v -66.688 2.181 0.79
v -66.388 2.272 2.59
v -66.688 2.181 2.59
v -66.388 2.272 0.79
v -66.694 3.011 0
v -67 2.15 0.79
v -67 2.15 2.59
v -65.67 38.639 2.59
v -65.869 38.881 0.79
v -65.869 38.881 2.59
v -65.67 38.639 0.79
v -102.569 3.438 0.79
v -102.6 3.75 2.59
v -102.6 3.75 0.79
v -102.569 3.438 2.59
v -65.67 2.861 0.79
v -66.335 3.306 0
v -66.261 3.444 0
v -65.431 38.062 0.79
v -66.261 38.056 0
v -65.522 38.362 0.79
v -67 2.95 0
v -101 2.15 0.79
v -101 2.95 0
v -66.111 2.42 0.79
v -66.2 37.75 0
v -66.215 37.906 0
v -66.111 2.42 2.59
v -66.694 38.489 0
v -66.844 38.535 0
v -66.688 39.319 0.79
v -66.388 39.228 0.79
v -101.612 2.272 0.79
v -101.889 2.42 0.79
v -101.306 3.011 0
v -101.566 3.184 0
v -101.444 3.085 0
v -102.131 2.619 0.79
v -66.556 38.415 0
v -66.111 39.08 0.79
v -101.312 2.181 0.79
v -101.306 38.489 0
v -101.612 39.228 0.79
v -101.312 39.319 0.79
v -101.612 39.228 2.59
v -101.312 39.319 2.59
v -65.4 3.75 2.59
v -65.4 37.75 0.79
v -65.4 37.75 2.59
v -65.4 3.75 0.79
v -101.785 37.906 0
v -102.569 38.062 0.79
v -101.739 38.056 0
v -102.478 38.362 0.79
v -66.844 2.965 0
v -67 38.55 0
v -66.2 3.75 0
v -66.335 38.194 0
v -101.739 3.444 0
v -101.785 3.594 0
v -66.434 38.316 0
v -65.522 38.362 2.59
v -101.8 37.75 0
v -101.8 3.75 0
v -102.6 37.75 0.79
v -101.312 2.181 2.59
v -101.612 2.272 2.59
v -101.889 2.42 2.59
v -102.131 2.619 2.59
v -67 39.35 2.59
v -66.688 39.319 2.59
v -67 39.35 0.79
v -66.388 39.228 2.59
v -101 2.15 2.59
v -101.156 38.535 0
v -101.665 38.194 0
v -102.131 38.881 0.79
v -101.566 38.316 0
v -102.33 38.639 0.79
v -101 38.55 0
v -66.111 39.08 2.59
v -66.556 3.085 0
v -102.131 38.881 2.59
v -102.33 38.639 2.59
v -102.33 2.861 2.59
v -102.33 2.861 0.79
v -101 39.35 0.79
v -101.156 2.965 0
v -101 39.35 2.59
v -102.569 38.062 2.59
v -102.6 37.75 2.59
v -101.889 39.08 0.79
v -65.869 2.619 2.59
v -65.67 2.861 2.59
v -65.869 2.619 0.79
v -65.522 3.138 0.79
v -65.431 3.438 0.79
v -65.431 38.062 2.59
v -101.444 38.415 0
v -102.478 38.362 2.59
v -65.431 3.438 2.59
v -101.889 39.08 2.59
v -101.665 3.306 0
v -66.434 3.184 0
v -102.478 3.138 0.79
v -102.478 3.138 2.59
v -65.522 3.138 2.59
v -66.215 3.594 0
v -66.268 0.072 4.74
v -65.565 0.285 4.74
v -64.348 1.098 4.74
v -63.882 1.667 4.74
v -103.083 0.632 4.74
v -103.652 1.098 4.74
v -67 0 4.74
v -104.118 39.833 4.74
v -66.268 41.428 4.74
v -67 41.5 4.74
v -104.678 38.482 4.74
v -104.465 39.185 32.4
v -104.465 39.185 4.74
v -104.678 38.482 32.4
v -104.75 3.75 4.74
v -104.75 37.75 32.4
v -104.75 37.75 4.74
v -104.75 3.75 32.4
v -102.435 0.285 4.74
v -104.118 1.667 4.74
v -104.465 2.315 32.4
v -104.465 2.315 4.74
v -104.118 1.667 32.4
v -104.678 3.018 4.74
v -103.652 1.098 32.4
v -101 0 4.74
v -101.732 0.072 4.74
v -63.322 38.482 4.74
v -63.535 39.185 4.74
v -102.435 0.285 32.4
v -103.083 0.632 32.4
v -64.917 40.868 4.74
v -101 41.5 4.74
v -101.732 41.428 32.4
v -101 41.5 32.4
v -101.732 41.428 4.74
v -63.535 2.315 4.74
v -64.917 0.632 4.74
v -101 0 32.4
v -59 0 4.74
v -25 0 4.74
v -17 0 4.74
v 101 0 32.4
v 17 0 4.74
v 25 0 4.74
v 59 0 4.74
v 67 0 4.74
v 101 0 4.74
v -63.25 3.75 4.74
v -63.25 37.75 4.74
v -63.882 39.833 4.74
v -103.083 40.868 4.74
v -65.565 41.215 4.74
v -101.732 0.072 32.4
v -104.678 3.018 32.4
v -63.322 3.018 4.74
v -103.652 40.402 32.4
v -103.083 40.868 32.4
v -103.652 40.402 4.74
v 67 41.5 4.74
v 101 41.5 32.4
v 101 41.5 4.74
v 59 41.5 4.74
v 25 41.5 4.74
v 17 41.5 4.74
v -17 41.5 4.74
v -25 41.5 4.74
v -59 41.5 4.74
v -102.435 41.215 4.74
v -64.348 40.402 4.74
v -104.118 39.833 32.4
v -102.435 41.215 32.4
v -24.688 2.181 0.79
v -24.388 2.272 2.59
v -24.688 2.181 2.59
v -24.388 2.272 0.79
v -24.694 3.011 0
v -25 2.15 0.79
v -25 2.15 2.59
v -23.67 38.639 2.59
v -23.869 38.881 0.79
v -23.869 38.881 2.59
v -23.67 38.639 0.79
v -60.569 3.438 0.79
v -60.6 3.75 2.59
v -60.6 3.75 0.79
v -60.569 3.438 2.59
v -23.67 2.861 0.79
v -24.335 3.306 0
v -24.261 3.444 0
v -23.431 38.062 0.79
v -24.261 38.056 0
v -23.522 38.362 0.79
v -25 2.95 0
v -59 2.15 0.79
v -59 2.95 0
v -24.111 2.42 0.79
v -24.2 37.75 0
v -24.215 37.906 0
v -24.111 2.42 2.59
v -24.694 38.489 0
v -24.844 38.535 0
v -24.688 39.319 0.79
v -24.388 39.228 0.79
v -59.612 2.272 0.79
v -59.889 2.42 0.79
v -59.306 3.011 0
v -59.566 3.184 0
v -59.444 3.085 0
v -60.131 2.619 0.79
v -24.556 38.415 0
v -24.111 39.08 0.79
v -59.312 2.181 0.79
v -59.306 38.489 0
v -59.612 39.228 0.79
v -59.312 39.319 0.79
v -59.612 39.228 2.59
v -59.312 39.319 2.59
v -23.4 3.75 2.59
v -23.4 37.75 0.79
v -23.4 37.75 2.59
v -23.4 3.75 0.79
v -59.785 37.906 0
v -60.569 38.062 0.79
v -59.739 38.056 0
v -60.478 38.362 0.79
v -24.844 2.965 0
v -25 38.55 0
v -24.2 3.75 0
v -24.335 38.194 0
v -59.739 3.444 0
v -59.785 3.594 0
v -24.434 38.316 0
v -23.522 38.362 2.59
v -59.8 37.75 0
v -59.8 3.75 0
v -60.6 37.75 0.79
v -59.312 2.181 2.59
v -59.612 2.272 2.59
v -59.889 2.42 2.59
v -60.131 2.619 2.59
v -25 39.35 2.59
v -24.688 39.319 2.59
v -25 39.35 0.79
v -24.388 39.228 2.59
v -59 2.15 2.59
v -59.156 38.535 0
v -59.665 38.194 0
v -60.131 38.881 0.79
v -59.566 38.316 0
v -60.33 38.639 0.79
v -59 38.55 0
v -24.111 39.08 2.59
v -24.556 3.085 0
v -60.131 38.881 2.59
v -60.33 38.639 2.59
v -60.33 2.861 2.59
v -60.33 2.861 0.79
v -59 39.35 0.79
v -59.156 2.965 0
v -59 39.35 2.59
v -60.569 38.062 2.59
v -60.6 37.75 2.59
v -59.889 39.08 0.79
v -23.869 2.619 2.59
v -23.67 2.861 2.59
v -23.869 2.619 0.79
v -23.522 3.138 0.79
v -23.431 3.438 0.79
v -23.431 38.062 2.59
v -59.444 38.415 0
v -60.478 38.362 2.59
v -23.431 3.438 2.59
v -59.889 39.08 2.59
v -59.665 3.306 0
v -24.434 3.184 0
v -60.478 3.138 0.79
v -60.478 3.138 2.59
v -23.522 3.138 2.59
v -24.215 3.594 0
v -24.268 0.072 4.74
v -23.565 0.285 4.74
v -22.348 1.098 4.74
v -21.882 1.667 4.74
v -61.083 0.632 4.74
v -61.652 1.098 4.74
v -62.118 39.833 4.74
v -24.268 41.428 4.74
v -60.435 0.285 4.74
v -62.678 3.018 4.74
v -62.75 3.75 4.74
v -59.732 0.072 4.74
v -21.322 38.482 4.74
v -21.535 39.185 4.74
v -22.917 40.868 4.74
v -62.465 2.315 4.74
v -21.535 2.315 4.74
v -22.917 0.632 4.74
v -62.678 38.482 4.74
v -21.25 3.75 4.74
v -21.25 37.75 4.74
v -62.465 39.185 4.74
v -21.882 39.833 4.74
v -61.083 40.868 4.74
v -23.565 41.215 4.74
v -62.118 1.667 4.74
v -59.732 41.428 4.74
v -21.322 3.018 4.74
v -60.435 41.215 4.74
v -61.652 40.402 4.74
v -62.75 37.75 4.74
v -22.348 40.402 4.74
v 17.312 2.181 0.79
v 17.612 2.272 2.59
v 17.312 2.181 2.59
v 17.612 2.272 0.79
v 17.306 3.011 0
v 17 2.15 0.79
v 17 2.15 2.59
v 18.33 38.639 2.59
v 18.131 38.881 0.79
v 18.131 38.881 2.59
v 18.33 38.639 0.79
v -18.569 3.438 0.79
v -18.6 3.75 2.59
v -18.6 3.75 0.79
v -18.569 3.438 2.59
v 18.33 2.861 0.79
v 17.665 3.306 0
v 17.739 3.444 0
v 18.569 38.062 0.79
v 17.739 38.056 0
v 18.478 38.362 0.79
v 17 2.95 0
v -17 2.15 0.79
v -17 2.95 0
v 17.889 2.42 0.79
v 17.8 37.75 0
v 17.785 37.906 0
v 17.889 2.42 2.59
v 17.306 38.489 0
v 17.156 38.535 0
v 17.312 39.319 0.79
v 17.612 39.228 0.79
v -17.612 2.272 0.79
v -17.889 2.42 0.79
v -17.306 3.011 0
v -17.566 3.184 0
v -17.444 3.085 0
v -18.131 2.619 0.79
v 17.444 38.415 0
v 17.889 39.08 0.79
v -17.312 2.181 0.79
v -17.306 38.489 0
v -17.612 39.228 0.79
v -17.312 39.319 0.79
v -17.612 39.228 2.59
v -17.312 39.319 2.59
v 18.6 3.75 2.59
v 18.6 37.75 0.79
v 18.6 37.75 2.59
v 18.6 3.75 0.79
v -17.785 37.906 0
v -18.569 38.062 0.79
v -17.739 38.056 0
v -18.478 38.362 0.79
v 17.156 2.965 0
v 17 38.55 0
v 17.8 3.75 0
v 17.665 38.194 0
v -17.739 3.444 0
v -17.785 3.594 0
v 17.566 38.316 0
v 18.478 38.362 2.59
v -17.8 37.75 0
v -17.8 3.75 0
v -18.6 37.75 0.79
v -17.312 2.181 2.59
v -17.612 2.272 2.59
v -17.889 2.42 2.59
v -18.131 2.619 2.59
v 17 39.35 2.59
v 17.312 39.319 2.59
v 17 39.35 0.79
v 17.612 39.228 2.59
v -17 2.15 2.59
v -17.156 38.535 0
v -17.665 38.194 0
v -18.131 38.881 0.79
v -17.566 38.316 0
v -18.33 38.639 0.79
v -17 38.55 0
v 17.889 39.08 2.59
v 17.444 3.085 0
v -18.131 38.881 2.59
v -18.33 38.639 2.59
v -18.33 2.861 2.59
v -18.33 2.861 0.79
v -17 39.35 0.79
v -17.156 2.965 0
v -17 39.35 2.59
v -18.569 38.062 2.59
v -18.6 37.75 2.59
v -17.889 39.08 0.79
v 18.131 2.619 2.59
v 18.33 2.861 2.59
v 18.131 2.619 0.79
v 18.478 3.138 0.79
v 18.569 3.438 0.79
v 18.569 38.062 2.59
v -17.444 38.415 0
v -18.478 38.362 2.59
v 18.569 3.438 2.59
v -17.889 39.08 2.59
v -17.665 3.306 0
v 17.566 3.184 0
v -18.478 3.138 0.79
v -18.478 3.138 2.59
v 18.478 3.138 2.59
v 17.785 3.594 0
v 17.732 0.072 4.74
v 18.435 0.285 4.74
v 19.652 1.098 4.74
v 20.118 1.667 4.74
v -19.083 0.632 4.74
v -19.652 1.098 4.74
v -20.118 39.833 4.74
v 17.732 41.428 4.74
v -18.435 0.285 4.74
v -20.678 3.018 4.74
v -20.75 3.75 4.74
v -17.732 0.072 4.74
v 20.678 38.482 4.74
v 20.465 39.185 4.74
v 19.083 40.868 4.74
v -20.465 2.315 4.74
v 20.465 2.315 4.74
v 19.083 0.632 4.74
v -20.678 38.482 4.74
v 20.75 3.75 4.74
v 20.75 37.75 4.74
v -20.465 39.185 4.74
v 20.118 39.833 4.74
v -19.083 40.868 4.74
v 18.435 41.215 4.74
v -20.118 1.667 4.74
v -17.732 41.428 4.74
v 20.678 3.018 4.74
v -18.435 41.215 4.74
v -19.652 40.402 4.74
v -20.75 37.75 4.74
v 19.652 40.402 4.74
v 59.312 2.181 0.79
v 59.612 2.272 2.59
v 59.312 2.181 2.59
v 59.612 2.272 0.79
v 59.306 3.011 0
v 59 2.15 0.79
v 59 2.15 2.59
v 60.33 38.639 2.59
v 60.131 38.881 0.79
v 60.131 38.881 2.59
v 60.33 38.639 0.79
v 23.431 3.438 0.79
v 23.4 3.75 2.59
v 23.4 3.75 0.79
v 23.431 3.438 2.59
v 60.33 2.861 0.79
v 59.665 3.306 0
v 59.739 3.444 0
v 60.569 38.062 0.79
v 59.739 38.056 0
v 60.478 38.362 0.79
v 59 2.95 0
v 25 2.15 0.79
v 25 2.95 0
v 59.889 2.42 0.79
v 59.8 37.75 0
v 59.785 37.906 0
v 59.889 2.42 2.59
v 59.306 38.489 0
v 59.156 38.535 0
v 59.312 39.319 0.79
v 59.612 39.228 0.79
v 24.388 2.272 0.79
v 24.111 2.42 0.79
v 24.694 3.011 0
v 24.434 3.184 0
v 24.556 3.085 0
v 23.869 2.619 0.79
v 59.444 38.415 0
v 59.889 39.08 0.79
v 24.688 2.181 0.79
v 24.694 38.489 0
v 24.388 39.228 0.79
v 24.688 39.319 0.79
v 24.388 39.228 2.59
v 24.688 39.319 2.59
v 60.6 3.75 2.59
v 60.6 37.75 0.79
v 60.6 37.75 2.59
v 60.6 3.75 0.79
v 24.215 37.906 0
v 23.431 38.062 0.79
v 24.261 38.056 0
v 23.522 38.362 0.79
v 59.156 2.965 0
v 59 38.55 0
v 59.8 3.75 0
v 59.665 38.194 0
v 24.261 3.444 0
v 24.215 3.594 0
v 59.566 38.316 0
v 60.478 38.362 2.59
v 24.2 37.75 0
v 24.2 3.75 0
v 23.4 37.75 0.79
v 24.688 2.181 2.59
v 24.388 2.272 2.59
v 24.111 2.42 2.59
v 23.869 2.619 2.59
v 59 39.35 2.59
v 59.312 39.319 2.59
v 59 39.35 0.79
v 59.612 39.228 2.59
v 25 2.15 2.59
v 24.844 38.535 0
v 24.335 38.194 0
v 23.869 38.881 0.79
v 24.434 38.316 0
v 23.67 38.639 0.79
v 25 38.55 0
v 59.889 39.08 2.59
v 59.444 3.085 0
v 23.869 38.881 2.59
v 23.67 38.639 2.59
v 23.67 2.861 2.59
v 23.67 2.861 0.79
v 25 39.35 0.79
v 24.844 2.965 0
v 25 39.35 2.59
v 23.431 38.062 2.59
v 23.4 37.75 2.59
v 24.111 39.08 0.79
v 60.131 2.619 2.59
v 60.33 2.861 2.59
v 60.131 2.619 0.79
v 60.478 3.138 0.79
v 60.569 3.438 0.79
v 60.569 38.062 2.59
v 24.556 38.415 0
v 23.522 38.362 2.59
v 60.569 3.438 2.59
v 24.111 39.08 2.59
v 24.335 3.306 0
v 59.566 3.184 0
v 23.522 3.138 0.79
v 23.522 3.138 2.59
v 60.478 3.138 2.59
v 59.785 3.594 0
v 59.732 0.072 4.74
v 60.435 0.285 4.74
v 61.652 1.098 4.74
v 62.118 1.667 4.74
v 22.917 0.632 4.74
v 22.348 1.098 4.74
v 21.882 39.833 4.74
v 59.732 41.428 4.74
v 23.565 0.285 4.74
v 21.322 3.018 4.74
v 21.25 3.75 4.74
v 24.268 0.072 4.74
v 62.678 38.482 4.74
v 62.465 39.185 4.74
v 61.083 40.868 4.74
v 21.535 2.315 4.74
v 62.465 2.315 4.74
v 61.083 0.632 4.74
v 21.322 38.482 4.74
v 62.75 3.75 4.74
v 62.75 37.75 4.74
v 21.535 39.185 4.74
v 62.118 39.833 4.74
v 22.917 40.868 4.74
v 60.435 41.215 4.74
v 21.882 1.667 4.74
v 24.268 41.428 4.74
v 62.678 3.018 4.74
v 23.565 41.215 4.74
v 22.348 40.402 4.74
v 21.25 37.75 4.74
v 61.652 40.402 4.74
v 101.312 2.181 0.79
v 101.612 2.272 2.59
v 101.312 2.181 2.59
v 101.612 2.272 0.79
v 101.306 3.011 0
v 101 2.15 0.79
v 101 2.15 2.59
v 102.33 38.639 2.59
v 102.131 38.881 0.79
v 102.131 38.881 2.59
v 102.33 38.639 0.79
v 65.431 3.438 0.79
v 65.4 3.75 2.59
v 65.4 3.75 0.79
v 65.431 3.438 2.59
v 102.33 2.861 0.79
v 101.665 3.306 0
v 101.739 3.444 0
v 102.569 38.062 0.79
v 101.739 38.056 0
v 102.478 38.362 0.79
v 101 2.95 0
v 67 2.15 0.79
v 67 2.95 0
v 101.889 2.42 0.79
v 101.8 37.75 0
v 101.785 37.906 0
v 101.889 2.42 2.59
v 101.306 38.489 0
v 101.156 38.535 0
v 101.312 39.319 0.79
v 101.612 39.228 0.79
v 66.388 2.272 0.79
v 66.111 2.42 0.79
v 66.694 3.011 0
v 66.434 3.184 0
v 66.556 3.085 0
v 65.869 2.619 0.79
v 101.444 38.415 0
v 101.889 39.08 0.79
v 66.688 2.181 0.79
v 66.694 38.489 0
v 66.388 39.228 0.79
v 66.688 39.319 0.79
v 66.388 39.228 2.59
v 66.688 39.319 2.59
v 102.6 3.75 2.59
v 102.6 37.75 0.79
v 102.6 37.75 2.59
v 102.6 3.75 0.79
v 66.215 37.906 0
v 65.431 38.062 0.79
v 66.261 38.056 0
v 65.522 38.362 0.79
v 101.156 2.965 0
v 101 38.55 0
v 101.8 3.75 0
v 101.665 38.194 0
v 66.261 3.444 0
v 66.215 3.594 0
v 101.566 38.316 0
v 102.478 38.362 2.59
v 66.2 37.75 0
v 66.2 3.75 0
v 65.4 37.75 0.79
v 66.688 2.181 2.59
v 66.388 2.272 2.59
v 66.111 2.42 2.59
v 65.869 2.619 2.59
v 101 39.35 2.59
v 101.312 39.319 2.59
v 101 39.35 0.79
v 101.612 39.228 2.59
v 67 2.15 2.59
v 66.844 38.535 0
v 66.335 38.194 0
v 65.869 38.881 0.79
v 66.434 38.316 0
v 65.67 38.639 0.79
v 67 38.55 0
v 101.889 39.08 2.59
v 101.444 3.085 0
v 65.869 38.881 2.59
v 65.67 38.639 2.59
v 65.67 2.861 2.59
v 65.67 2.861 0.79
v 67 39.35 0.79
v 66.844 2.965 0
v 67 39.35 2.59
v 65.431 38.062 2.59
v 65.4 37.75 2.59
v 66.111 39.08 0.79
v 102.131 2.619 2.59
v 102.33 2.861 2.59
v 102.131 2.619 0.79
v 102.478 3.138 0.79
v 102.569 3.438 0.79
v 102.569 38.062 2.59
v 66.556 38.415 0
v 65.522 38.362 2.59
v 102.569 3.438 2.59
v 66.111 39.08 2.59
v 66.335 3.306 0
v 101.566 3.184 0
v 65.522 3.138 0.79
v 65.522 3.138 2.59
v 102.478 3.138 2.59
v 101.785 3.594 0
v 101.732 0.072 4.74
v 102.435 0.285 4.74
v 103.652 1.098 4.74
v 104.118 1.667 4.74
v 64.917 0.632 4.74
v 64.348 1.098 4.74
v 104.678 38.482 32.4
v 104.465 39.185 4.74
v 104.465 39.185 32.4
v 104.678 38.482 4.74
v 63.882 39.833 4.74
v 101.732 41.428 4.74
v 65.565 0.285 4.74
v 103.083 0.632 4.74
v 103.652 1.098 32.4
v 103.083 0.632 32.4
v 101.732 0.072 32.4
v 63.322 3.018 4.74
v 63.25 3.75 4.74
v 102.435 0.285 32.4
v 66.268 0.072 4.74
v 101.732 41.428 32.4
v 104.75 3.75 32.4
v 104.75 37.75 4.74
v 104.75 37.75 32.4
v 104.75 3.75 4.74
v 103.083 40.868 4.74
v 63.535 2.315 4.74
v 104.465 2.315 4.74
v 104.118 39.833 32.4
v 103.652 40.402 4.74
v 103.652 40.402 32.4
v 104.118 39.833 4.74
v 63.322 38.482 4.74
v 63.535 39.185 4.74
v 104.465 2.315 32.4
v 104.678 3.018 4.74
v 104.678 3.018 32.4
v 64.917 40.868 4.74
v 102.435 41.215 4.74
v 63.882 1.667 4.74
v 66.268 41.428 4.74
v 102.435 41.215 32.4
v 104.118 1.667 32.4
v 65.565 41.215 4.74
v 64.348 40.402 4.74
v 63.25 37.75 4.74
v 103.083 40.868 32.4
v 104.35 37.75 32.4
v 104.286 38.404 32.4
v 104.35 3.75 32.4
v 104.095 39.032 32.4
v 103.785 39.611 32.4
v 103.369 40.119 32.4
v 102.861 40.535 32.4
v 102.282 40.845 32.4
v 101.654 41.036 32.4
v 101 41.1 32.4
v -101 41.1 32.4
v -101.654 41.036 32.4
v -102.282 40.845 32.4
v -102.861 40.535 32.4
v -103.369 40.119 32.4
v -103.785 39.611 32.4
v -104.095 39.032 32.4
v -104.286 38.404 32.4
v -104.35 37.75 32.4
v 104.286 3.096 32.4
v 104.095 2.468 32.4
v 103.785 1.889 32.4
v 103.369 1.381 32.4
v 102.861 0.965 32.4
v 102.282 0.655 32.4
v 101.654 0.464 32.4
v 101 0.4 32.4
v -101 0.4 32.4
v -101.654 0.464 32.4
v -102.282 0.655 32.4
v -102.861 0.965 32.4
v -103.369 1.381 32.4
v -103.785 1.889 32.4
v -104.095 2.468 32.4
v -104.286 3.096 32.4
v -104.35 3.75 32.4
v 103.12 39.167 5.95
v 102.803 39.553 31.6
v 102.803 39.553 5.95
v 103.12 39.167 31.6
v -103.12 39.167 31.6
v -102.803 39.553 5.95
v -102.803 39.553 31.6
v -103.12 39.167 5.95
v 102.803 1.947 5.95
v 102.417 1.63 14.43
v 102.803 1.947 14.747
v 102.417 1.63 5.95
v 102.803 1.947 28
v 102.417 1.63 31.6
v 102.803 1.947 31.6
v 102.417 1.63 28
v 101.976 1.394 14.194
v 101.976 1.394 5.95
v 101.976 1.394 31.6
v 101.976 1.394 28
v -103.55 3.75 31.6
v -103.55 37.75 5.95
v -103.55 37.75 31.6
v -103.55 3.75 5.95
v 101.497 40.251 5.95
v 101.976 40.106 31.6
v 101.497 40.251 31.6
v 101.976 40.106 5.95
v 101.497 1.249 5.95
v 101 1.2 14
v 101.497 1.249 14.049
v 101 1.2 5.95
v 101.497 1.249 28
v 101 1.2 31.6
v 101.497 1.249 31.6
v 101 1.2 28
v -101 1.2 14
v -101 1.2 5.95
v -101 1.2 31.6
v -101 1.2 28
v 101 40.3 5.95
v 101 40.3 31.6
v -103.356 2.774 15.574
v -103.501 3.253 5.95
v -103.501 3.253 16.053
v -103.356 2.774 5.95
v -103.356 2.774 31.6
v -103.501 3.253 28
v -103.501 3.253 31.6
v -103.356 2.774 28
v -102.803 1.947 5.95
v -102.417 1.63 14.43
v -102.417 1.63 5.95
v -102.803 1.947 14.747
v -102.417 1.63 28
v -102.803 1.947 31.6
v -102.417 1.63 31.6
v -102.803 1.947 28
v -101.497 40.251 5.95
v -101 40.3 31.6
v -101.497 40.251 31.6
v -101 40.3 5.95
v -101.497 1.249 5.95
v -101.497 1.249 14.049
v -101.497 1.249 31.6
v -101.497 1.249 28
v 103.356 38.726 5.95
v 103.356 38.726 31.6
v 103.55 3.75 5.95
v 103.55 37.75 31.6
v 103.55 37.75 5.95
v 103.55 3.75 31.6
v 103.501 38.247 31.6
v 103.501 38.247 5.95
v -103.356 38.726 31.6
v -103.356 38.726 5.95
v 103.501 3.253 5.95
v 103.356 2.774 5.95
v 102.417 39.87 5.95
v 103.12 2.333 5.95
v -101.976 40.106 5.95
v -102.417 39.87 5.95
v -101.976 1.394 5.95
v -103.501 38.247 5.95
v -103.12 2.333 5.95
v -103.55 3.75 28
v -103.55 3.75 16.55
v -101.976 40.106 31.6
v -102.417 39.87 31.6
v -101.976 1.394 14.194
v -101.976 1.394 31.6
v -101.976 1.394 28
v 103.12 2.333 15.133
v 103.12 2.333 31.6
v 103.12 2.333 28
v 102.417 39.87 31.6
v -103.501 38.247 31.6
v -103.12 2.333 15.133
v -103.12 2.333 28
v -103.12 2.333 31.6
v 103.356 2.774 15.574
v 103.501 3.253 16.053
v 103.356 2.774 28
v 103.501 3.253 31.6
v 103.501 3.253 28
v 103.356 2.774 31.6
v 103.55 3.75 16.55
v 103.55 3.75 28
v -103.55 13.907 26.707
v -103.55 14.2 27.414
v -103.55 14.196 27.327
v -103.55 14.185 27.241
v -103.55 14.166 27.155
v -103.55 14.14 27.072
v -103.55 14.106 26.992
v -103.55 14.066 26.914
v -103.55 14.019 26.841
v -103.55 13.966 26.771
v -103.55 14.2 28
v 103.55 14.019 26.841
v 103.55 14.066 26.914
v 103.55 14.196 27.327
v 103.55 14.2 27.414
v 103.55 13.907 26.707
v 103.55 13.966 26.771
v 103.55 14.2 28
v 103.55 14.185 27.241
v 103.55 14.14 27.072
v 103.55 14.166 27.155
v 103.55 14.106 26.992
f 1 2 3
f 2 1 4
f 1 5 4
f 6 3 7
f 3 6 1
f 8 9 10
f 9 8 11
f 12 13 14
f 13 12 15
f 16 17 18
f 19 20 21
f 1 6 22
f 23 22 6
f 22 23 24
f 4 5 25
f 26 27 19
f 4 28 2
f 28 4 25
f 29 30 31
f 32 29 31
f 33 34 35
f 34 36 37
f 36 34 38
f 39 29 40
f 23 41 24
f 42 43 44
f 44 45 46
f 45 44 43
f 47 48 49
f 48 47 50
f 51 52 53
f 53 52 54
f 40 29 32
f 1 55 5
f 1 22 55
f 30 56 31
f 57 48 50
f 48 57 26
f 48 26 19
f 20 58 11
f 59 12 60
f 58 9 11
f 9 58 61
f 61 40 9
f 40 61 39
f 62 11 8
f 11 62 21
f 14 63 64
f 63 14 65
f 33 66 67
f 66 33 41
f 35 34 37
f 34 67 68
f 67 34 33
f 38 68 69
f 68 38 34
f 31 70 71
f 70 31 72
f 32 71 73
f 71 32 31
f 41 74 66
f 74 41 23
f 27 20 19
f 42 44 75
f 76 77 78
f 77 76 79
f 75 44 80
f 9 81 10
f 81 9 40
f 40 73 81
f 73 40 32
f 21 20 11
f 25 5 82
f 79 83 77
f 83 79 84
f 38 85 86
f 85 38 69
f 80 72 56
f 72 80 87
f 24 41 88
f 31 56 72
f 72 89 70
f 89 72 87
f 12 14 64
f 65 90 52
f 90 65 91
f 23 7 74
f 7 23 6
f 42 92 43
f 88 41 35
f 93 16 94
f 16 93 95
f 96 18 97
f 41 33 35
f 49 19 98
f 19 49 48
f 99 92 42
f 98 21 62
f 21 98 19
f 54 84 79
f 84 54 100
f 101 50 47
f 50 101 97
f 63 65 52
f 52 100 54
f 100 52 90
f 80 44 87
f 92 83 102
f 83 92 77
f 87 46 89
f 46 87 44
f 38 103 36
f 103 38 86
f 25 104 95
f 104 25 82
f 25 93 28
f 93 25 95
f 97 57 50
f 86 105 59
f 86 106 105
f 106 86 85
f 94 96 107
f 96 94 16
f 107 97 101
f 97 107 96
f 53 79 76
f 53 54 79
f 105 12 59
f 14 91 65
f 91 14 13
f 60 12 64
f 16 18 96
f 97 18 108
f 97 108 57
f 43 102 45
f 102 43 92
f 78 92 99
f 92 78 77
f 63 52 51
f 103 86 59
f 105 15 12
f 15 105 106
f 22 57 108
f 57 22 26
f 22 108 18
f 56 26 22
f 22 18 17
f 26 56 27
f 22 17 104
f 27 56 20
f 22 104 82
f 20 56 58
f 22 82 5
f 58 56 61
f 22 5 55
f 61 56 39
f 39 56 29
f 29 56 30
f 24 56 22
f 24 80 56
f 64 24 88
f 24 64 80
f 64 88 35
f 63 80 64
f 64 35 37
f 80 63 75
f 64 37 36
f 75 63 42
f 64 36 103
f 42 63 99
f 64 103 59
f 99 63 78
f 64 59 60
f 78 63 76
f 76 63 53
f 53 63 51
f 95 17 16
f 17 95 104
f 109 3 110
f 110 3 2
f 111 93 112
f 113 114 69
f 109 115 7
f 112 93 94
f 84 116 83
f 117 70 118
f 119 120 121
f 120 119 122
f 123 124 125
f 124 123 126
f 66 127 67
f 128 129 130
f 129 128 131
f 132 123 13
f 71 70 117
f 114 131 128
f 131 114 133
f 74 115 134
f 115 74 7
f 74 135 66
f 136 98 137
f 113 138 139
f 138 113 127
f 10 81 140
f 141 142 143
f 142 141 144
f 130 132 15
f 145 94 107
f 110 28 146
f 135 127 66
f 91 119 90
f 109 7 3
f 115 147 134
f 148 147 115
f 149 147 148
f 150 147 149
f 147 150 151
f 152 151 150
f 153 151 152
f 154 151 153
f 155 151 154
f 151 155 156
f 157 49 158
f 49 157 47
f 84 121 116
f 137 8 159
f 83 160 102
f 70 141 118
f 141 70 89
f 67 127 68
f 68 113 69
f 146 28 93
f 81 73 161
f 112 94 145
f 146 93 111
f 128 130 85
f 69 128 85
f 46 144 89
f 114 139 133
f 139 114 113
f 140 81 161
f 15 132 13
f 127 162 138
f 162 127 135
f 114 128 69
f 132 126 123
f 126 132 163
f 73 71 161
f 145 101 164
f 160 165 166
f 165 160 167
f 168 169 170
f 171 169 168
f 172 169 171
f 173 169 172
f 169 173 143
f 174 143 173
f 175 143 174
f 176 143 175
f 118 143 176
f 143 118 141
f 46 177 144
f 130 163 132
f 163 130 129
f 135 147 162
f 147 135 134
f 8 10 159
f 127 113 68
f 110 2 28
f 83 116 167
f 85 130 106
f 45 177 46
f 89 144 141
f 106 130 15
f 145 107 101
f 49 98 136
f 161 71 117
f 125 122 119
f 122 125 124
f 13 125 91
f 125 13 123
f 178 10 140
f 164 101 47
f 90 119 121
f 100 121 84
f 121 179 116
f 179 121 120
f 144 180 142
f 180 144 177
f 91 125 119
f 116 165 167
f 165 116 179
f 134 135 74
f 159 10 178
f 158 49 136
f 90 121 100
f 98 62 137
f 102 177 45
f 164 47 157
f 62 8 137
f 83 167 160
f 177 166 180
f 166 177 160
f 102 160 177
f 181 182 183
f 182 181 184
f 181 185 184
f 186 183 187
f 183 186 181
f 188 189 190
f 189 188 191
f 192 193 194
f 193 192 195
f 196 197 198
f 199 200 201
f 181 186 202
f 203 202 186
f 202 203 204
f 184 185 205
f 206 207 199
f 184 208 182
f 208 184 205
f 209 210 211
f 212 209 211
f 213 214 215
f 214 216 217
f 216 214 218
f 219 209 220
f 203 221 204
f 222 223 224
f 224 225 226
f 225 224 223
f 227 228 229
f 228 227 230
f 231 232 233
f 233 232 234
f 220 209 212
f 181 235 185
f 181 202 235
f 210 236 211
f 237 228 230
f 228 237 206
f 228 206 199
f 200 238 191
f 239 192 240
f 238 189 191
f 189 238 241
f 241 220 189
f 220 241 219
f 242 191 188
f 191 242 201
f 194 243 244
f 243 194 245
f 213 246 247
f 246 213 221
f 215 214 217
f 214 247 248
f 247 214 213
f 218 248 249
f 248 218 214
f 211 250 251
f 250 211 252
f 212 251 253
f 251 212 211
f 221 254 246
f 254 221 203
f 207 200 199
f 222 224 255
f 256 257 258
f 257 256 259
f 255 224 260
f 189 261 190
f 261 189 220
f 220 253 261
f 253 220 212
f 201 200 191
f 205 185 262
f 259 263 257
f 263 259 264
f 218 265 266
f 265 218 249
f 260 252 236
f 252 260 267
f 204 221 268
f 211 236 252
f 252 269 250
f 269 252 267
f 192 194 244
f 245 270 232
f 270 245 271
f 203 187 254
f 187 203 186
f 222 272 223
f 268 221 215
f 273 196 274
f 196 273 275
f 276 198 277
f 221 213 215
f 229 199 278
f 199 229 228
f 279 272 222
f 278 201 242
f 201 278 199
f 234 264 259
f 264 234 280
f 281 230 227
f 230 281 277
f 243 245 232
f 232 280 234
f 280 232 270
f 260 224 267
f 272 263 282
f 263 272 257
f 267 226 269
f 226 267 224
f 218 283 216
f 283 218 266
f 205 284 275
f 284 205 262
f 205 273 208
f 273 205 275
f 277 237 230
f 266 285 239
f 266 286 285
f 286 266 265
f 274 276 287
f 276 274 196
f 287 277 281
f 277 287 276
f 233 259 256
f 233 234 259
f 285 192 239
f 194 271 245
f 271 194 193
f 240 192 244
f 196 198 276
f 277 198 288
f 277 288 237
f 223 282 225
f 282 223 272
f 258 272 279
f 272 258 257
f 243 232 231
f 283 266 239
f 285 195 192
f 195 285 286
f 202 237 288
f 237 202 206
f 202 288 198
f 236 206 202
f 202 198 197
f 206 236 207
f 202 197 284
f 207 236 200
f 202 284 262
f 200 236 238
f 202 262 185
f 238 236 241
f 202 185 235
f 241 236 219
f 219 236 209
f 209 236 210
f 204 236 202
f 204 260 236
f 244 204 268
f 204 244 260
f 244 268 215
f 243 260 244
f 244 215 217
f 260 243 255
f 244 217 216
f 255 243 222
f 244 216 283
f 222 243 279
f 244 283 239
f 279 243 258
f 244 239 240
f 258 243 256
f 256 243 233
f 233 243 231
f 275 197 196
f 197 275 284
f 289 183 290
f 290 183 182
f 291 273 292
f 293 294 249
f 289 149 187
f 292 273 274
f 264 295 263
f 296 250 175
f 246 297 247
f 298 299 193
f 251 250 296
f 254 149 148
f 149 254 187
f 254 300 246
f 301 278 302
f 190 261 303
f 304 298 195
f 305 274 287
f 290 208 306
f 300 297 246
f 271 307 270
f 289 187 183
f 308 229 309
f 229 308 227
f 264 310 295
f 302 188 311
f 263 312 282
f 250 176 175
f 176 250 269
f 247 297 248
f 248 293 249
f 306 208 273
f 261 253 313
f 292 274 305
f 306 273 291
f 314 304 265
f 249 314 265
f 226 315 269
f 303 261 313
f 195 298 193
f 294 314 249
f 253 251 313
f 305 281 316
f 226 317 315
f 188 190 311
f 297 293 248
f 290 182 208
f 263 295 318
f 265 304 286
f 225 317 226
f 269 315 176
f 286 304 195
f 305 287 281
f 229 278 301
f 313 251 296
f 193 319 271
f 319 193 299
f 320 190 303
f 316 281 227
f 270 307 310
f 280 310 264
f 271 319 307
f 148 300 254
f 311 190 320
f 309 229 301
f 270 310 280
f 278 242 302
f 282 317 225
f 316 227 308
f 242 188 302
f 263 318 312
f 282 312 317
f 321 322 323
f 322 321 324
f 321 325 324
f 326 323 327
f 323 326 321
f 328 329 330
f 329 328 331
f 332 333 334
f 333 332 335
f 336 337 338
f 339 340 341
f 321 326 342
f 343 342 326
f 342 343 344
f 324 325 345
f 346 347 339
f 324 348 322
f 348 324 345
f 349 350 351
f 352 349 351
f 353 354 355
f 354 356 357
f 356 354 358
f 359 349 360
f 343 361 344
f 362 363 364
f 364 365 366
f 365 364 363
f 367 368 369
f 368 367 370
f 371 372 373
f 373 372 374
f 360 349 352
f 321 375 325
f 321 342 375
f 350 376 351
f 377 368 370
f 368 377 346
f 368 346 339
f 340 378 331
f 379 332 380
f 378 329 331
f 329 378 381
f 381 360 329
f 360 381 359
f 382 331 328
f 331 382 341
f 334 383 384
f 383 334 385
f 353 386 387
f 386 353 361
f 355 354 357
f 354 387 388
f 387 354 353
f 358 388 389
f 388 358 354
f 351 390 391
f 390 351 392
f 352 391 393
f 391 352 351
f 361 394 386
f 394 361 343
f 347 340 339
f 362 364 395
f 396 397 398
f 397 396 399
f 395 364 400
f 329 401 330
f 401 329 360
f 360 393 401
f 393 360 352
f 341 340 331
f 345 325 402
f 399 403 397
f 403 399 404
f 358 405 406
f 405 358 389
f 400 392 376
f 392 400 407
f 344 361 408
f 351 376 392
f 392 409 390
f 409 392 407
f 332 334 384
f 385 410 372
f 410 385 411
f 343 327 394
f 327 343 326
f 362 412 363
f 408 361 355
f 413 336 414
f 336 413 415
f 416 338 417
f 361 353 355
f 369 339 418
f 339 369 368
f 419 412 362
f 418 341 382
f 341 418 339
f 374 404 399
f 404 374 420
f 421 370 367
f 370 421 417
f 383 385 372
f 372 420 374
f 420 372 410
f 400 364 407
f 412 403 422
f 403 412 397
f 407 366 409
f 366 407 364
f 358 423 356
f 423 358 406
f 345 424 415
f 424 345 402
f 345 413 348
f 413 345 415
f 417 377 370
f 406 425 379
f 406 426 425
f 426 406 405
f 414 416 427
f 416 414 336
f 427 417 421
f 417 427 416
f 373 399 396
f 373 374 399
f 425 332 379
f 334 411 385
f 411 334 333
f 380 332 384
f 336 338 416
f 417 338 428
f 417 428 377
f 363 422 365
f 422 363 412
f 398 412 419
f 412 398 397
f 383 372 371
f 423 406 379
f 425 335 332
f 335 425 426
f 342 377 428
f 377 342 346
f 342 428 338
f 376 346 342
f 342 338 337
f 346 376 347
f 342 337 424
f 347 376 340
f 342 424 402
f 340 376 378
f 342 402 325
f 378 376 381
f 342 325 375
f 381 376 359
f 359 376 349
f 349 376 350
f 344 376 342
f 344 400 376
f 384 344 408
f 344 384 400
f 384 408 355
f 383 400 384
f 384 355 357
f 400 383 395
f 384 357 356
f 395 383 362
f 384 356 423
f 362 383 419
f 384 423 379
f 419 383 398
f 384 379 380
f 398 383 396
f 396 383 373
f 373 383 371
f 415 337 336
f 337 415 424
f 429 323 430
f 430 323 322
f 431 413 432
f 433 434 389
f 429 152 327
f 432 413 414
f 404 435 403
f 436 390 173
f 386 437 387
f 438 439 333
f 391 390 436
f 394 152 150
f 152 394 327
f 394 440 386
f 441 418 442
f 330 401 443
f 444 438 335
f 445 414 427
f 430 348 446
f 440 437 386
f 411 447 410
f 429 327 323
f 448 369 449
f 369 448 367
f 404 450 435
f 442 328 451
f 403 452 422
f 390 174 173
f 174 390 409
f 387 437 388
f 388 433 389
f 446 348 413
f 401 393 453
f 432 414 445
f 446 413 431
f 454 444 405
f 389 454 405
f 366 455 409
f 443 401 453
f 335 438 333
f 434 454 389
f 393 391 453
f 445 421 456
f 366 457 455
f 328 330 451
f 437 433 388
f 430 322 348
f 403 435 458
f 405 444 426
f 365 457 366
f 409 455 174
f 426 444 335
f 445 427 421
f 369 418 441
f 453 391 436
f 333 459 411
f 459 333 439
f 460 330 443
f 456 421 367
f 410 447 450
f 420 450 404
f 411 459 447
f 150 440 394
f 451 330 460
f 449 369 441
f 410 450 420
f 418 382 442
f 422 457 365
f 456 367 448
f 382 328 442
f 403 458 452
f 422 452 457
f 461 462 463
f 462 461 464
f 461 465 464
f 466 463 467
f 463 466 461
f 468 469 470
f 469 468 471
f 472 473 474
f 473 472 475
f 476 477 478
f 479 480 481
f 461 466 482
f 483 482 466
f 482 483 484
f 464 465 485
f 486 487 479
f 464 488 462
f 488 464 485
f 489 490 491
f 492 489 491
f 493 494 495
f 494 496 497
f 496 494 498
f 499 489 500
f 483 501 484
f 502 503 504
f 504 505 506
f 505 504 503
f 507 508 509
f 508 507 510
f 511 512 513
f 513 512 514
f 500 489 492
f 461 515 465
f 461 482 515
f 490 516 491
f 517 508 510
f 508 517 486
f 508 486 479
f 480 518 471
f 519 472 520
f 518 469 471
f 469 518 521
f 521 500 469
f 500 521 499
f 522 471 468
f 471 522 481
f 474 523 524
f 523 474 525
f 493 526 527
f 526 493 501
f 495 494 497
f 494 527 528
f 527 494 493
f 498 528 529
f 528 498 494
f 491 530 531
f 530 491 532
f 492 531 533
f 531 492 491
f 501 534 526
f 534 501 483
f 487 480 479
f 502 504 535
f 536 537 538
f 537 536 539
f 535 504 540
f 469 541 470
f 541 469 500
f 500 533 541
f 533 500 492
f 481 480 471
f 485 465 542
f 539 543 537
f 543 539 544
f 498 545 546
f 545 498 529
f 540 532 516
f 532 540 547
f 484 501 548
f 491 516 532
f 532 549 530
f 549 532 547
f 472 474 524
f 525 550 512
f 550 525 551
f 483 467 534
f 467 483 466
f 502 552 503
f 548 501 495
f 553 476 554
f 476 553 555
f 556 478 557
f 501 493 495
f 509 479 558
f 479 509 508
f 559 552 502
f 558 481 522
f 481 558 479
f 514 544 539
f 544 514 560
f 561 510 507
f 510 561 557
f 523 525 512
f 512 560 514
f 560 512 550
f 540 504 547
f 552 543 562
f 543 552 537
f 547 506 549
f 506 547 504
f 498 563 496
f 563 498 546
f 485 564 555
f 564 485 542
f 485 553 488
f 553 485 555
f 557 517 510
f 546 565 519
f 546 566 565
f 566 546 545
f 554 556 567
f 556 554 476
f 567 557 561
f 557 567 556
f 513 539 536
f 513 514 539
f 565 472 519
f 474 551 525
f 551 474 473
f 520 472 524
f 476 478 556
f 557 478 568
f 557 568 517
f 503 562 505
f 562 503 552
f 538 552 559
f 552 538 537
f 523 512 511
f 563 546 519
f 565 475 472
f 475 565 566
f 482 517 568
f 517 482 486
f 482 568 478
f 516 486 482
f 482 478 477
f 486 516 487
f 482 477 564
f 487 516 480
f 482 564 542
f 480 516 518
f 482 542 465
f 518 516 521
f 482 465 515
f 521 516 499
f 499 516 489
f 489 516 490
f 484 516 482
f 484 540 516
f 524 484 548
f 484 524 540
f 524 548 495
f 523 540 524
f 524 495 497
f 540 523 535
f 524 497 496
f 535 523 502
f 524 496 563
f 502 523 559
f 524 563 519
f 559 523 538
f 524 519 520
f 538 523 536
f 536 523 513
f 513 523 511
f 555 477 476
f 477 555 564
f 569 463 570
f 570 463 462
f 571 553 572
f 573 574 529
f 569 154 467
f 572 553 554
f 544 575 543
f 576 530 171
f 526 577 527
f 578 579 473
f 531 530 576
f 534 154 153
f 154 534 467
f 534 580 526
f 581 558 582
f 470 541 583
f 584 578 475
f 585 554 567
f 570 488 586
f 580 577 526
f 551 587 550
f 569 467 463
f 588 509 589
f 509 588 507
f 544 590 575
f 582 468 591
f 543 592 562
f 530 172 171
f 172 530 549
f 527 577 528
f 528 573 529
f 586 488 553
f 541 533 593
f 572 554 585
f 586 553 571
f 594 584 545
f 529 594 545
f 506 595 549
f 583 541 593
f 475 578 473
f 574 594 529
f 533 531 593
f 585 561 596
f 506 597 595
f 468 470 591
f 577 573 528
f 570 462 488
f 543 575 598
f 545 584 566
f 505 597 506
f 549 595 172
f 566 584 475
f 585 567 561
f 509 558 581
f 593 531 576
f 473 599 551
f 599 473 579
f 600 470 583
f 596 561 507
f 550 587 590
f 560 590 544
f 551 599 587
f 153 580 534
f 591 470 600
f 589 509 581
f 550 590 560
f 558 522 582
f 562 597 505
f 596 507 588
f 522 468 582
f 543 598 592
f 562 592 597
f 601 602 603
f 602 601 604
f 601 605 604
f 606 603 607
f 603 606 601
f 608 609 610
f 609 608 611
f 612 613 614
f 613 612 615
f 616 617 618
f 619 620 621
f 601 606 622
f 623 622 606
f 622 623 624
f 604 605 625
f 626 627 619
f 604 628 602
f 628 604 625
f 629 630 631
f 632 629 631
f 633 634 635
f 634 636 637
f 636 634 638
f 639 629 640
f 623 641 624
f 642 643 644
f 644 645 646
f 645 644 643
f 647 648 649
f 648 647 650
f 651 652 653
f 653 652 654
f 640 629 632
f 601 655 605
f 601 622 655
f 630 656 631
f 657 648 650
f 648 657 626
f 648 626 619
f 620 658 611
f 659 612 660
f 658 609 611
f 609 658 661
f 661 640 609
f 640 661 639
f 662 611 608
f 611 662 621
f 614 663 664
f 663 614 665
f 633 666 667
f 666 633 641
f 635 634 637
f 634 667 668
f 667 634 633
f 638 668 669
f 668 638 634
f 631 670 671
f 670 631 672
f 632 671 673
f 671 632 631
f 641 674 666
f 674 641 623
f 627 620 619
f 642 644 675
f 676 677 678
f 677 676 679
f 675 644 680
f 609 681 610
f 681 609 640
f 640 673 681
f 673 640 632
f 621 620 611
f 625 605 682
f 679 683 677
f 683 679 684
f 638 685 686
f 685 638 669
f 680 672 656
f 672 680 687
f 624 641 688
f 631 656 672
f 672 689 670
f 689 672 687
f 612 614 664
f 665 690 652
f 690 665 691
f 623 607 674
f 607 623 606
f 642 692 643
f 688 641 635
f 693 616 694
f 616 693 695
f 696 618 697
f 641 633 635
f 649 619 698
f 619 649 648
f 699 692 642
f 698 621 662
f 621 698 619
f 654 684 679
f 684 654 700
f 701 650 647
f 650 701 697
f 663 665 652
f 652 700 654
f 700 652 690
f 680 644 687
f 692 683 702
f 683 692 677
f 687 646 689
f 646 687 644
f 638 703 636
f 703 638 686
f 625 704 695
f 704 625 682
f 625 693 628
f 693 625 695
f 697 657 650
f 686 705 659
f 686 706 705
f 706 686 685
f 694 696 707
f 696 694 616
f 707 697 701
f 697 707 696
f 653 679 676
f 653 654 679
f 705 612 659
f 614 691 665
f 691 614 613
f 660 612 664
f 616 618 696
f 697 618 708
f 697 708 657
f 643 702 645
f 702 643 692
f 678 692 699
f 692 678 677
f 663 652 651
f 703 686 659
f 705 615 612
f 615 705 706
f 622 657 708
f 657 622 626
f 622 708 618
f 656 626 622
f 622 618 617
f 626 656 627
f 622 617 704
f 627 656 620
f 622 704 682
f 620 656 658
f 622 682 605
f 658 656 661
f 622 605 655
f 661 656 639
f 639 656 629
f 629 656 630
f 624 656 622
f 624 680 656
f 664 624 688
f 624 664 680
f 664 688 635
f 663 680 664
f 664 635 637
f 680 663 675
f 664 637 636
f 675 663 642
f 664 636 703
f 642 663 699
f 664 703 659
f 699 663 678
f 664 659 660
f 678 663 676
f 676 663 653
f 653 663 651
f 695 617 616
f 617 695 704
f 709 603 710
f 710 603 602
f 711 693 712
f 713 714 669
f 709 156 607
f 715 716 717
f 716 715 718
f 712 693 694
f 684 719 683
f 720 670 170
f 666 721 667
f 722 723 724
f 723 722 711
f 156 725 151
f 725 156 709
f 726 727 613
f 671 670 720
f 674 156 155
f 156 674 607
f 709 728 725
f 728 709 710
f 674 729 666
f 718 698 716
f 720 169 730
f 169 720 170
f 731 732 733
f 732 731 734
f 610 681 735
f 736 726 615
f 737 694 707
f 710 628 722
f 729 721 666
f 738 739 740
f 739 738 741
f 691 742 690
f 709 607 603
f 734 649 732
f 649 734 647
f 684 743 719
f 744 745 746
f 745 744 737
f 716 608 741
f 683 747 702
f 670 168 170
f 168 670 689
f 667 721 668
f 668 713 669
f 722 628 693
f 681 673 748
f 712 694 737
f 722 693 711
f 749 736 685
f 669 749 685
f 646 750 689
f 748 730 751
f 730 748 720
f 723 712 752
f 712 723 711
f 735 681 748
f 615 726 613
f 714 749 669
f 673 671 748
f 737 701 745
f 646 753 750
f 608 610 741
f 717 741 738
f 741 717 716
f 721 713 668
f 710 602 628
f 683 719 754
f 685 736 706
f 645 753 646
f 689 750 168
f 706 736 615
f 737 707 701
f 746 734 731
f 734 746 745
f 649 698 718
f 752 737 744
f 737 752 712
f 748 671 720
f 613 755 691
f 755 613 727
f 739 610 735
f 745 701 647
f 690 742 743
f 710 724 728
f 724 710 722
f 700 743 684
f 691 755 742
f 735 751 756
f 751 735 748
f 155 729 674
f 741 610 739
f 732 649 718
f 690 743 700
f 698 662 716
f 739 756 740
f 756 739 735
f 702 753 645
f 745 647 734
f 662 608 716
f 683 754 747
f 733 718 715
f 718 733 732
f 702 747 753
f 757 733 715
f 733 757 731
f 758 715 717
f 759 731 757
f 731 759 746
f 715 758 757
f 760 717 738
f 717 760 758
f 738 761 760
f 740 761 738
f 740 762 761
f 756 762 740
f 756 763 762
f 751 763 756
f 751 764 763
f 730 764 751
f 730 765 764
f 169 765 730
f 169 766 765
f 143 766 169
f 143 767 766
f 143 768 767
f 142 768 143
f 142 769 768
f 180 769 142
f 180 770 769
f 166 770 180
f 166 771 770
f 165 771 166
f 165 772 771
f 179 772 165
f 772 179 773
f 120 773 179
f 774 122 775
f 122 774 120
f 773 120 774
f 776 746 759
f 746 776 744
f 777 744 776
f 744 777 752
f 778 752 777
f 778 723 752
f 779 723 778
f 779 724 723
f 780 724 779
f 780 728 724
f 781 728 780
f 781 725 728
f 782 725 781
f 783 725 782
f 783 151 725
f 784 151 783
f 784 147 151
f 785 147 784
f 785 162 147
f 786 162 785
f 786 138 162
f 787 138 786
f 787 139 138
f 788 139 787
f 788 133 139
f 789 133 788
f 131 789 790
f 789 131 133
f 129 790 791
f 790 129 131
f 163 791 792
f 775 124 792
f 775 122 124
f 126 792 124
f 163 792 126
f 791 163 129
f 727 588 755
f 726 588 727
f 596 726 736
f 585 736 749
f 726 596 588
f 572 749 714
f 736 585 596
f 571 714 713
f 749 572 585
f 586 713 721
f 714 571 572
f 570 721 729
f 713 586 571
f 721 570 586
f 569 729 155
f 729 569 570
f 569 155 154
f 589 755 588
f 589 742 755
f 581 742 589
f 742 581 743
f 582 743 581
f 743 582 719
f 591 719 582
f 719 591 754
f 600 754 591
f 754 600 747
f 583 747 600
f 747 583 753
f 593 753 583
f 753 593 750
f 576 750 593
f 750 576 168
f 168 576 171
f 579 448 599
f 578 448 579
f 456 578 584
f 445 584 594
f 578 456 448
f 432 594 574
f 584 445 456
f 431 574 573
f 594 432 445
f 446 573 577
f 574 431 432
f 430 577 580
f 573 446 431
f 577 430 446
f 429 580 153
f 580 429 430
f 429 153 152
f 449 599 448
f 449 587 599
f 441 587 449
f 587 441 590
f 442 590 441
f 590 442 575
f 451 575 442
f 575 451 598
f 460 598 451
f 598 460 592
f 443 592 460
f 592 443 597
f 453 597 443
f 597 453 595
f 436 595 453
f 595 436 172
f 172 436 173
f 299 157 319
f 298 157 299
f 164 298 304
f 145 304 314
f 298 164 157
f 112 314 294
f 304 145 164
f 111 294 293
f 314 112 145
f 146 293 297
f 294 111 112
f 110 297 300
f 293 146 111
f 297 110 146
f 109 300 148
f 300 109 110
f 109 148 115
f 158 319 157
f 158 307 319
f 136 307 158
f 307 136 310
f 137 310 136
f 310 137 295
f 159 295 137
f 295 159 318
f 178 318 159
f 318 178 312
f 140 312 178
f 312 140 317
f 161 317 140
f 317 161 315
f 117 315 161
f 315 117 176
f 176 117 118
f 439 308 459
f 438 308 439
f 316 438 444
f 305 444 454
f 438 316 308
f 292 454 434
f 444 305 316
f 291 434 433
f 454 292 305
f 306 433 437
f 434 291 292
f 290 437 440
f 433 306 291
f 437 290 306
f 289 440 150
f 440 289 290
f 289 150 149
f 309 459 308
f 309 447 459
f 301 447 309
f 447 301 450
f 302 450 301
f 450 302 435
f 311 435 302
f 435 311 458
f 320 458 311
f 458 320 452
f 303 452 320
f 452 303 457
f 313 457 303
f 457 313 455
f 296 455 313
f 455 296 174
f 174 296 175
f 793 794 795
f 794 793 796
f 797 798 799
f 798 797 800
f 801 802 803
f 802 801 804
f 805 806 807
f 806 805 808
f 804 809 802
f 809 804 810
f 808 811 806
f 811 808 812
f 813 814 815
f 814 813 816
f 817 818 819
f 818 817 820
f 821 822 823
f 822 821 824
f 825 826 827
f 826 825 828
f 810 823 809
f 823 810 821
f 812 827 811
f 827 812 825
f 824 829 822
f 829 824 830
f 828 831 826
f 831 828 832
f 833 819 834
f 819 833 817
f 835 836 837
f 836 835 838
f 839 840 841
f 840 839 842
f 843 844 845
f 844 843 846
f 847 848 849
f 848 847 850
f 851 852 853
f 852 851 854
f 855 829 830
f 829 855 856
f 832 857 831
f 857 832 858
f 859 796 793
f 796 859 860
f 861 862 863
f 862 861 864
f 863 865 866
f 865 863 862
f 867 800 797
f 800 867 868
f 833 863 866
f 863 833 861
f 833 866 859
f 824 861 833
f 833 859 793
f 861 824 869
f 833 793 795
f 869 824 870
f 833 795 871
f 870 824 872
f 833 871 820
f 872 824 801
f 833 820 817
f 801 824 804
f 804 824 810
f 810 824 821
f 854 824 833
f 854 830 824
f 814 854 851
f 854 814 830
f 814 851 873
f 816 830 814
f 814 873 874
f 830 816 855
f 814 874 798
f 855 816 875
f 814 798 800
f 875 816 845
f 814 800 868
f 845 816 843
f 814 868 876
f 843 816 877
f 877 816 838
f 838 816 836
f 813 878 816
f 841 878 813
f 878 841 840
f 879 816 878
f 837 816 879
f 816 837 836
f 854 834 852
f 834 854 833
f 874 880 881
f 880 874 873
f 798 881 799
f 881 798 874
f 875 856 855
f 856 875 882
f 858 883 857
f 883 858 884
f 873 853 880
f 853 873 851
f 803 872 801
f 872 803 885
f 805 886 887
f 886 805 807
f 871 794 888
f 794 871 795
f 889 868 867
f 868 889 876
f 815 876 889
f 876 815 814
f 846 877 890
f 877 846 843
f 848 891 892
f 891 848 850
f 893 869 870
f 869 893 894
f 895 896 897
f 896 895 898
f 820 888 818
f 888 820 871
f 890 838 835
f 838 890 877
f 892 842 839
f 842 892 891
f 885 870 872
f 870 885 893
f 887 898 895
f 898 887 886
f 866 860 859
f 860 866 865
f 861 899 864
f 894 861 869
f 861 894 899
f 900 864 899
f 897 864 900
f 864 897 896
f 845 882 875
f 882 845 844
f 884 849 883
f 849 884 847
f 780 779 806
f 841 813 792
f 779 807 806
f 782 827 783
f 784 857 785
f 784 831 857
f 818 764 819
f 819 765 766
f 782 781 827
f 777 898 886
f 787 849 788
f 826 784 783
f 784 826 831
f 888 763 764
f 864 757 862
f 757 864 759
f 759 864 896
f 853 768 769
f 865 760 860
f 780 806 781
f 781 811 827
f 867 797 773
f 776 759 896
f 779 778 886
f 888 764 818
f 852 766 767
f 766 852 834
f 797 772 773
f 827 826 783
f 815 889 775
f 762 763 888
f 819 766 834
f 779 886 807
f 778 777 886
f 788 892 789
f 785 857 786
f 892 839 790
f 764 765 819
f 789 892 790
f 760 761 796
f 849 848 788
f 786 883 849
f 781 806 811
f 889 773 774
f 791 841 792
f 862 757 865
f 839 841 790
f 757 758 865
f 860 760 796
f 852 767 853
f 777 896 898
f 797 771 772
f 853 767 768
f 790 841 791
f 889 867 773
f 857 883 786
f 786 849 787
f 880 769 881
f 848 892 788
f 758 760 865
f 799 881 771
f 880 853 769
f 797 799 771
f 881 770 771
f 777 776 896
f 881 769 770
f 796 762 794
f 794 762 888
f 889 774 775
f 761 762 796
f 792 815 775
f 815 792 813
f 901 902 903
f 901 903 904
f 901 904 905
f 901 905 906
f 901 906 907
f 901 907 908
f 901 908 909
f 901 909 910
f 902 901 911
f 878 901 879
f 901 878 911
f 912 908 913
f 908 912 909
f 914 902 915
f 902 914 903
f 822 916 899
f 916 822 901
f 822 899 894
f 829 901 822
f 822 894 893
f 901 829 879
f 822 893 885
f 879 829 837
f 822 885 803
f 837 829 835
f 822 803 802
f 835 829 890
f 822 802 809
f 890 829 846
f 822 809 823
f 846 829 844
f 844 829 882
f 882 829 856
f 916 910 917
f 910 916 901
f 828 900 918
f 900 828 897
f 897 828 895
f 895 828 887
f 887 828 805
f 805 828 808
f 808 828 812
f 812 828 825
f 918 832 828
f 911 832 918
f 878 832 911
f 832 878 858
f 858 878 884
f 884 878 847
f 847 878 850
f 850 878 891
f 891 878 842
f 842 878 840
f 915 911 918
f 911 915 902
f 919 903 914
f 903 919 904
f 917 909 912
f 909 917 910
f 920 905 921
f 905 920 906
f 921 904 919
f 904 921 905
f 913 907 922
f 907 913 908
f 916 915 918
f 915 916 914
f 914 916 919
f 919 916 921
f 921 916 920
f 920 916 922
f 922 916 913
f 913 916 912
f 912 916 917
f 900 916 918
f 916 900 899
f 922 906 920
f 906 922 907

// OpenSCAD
// file: ../../modules/gridfinity.scad
// Gridfinity ベースプレートの共有 module。
// 寸法は Gridfinity 仕様 (Zack Freedman) の baseplate 輪郭に従う:
//   ピッチ 42、ソケット上端開口 41.5 (角 R4)、上から 45° 面取り 2.15 →
//   垂直 1.8 (37.2 角・R1.85) → 45° 面取り 0.7 → 底 35.8 角 (R1.15)。
//   ソケット深さ = 2.15 + 1.8 + 0.7 = 4.65。
//
// 座標系: X が列方向 (中央が 0)、Y が行方向 (板の前端が 0)、Z=0 が板の底面。
// 板の外形は grid とは独立に rim で与えるので、grid より大きい板 (縁付き) を
// 作れる。ソケットは rim=[left, right, front, back] の内側へ 42 ピッチで並ぶ。

gf_pitch = 42;
gf_socket_top = 41.5; // 上端開口
gf_socket_mid = 37.2; // 垂直部
gf_socket_bot = 35.8; // 底
gf_socket_r_top = 4;
gf_socket_r_mid = 1.85;
gf_socket_r_bot = 1.15;
gf_chamfer_top = 2.15;
gf_wall_h = 1.8;
gf_chamfer_bot = 0.7;
gf_socket_depth = gf_chamfer_top + gf_wall_h + gf_chamfer_bot; // 4.65
gf_fn = 32;
gf_eps = 0.01; // hull 用の薄板の厚さ
gf_over = 0.5; // 切削の抜き代

// 角丸正方形 (一辺 w、角 R)
module
gf_rounded_square(w, r)
{
    offset(r = r, $fn = gf_fn) square(w - 2 * r, center = true);
}

// 厚さ gf_eps の角丸正方形の薄板を z に置く (hull の骨)
module
gf_slab(w, r, z)
{
    translate([ 0, 0, z ]) linear_extrude(gf_eps) gf_rounded_square(w, r);
}

// ソケット1個の切削体。z=0 がソケットの底 (床の天面)、+Z へ 4.65 で天面に出る。
// clearance は嵌合の逃げで、輪郭を全周へ clearance だけ外へ出す (幅 +2c、角 R
// +c)。 既定 0 が Gridfinity の公称輪郭。深さとピッチは変えない
module
gf_socket_cut(clearance = 0)
{
    z1 = gf_chamfer_bot;
    z2 = z1 + gf_wall_h;
    z3 = gf_socket_depth;
    c = clearance;
    hull()
    {
        gf_slab(gf_socket_bot + 2 * c, gf_socket_r_bot + c, 0);
        gf_slab(gf_socket_mid + 2 * c, gf_socket_r_mid + c, z1 - gf_eps);
    }
    hull()
    {
        gf_slab(gf_socket_mid + 2 * c, gf_socket_r_mid + c, z1 - gf_eps);
        gf_slab(gf_socket_mid + 2 * c, gf_socket_r_mid + c, z2 - gf_eps);
    }
    hull()
    {
        gf_slab(gf_socket_mid + 2 * c, gf_socket_r_mid + c, z2 - gf_eps);
        gf_slab(gf_socket_top + 2 * c, gf_socket_r_top + c, z3 - gf_eps);
    }
    // 天面より上へ抜く (天面と同一平面の退化した面を残さない)
    gf_slab(gf_socket_top + 2 * c, gf_socket_r_top + c, z3 - gf_eps);
    translate([ 0, 0, z3 - gf_eps ]) linear_extrude(gf_over + gf_eps)
        gf_rounded_square(gf_socket_top + 2 * c, gf_socket_r_top + c);
}

// ベースプレート。cols x rows のソケットを床 floor_t の上に彫る。
// rim = [left, right, front, back] はソケット列の外側に残す縁の幅。
// 板の幅 = cols*42 + left + right、奥行き = rows*42 + front + back。
// clearance はソケットの嵌合の逃げ (gf_socket_cut を参照)。
module
gf_baseplate(cols, rows, rim = [ 0, 0, 0, 0 ], floor_t = 1, clearance = 0)
{
    grid_w = cols * gf_pitch;
    grid_d = rows * gf_pitch;
    plate_w = grid_w + rim[0] + rim[1];
    plate_d = grid_d + rim[2] + rim[3];
    x0 = -plate_w / 2 + rim[0]; // ソケット列の左端
    difference()
    {
        translate([ -plate_w / 2, 0, 0 ])
            cube([ plate_w, plate_d, floor_t + gf_socket_depth ]);
        for (c = [0:cols - 1], r = [0:rows - 1])
            translate([
                x0 + (c + 0.5) * gf_pitch,
                rim[2] + (r + 0.5) * gf_pitch,
                floor_t
            ]) gf_socket_cut(clearance);
    }
}
// file: ../../modules/gridfinity_bin.scad
include <gridfinity.scad>

// Gridfinity bin (箱) の共有 module。ピッチと角丸は gridfinity.scad
// と共有する。 底の輪郭は Gridfinity 仕様の bin base (下から):
//   35.6 角 (R0.8) → 45° 0.8 → 37.2 角 (R1.6) → 垂直 1.8 → 45° 2.15 → 41.5 角
//   (R3.75) 高さ 0.8 + 1.8 + 2.15 = 4.75。磁石穴・ネジ穴は持たない (無垢)
// 外形はピッチ − 0.5 (1 マス 41.5)、角 R3.75。高さ単位 7 (4U = 28 が壁の上端)。
// リップは「薄いリップ」: 壁 (1.2) をそのまま lip_h (4.4) 伸ばし、内側の上端を
// 45° に落とすだけ。内側に棚 (厚い肉) を持たないので、上に載せる bin は底の
// 面取りをこの 45° に座らせる。
//
// 座標系: X が列方向 (中央 0)、Y が行方向 (手前 = ラベル側が 0)、Z=0 が底面。

gfb_outer = gf_pitch - 0.5; // 41.5
gfb_outer_r = 3.75;
gfb_base_bot = 35.6;
gfb_base_bot_r = 0.8;
gfb_base_mid = 37.2;
gfb_base_mid_r = 1.6;
gfb_base_chamfer_bot = 0.8;
gfb_base_wall_h = 1.8;
gfb_base_chamfer_top = 2.15;
gfb_base_h =
    gfb_base_chamfer_bot + gfb_base_wall_h + gfb_base_chamfer_top; // 4.75
gfb_unit = 7;
gfb_lip_h = 4.4;
gfb_lip_chamfer = 0.8;

// bin 1 マスぶんの底 (無垢)。z=0 が底面、gfb_base_h で外形 41.5 角に達する
module
gfb_base_cell()
{
    z1 = gfb_base_chamfer_bot;
    z2 = z1 + gfb_base_wall_h;
    z3 = gfb_base_h;
    hull()
    {
        gf_slab(gfb_base_bot, gfb_base_bot_r, 0);
        gf_slab(gfb_base_mid, gfb_base_mid_r, z1 - gf_eps);
    }
    hull()
    {
        gf_slab(gfb_base_mid, gfb_base_mid_r, z1 - gf_eps);
        gf_slab(gfb_base_mid, gfb_base_mid_r, z2 - gf_eps);
    }
    hull()
    {
        gf_slab(gfb_base_mid, gfb_base_mid_r, z2 - gf_eps);
        gf_slab(gfb_outer, gfb_outer_r, z3 - gf_eps);
    }
}

// cols x rows の角丸矩形 (外形)
module
gfb_footprint(cols, rows, inset = 0)
{
    w = cols * gf_pitch - 0.5 - 2 * inset;
    d = rows * gf_pitch - 0.5 - 2 * inset;
    translate([ 0, d / 2 + inset ])
        gf_rounded_square_wd(w, d, gfb_outer_r - inset);
}

// 幅 w × 奥行き d の角丸矩形 (中心が原点)
module
gf_rounded_square_wd(w, d, r)
{
    offset(r = r, $fn = gf_fn) square([ w - 2 * r, d - 2 * r ], center = true);
}

// ラベル天板の Y-Z 断面 (y = 壁の内面からの距離、z = 高さ)。天板 (厚さ t) の
// 先端から 45° の斜面が壁まで下りる無垢のくさび。先端の垂直面と斜面の境目
// (135°) を半径 r で丸める: 円弧の中心は先端の角から (-r, r·tan22.5°)、接点は
// 垂直面上の角 + (0, r·tan22.5°) と斜面上の角 + 0.4142r·(-1,-1)。壁の内側へ
// 1 だけ食い込ませて胴体と溶かす
function gfb_label_profile(d, t, h, r) =
    let(y0 = d, z0 = h - t, cy = y0 - r, cz = z0 + r * tan(22.5))
        concat([ [ -1, h ], [ d, h ] ],
               [for (a = [0:-5:-45])[cy + r * cos(a), cz + r* sin(a)]],
               [[ -1, h - t - d - 1 ]]);

// bin 本体。units は高さ (U)。wall / floor_t は壁と床の厚さ。
// label_d > 0 なら手前 (y=0) の壁の上端 (z = units*7) と面一で内側へ label_d
// 張り出す厚さ label_t のラベル天板を付ける。天板の下は 45° の無垢のくさびが
// 壁まで下りる (ブリッジもリブも無い。中身はスライサのインフィル任せ)。
// 天板の先端と 45° 面の境目は半径 label_r で丸める
module
gfb_bin(cols,
        rows,
        units = 4,
        wall = 1.2,
        floor_t = 1.2,
        label_d = 0,
        label_t = 1,
        label_r = 1)
{
    h = units * gfb_unit; // 壁の上端
    top = h + gfb_lip_h;  // リップの上端
    inner_w = cols * gf_pitch - 0.5 - 2 * wall;
    floor_top = gfb_base_h + floor_t;
    union()
    {
        // 底: マスごとの無垢の base
        for (c = [0:cols - 1], r = [0:rows - 1])
            translate([
                (c - (cols - 1) / 2) * gf_pitch,
                (r + 0.5) * gf_pitch - 0.25,
                0
            ]) gfb_base_cell();
        // 胴体: base の上から top
        // まで。内側は床の上を抜く。リップの内側の上端は 45°
        difference()
        {
            translate([ 0, 0, gfb_base_h - gf_eps ])
                linear_extrude(top - gfb_base_h + gf_eps)
                    gfb_footprint(cols, rows);
            translate([ 0, 0, floor_top ])
                linear_extrude(top - floor_top + gf_over)
                    gfb_footprint(cols, rows, wall);
            // リップ内側の面取り: 上端で wall − 0.4 まで開く
            hull()
            {
                translate([ 0, 0, top - gfb_lip_chamfer ])
                    linear_extrude(gf_eps) gfb_footprint(cols, rows, wall);
                translate([ 0, 0, top ]) linear_extrude(gf_over)
                    gfb_footprint(cols, rows, wall - gfb_lip_chamfer);
            }
        }
        // ラベル天板と 45° くさび (内幅いっぱい、同じ断面)。壁へ 1 食い込ませた
        // 矩形の柱なので、角の丸み (R3.75) の外へ出ないよう外形で切り取る
        if (label_d > 0)
            intersection()
            {
                translate([ -inner_w / 2, wall, 0 ]) rotate([ 90, 0, 90 ])
                    linear_extrude(inner_w) polygon(
                        gfb_label_profile(label_d, label_t, h, label_r));
                linear_extrude(top) gfb_footprint(cols, rows);
            }
    }
}
// file: ../../modules/gridfinity_bin_4u.scad
include <gridfinity_bin.scad>

// assets/gridfinity-bin/ の bin 群の共通値と、サイズ 3 引数の払い出し口。
// 単体では何も描かない。設計の経緯と確定値は
// ledger/designs/gridfinity-bin-4u.md が正本。 保証する範囲は cols 1..5 ×
// rows 1..5 × units 4 (assets に並ぶ 25 種)。 cols が X (横)、rows が Y
// (ラベルの壁から奥へ)、units が高さ (7mm 単位)。
wall = 1.2;    // 0.4 ノズル 3 本
floor_t = 1.2; // 底 (4.75) の上に載せる床。床の天面 z = 5.95
label_d = 13;  // 12mm 幅のラベルシールを貼る天板の張り出し
label_t = 1; // 天板の厚さ (user 指定)。下は 45° の無垢のくさび
label_r = 1; // 天板の先端と 45° 面の境目の R (user 指定)

function bin_contract(cols, rows, units) = str("CONTRACT units=",
                                               units,
                                               " pitch=",
                                               gf_pitch,
                                               " outer=",
                                               gfb_outer,
                                               " h=",
                                               units* gfb_unit,
                                               " lip=",
                                               gfb_lip_h,
                                               " base=",
                                               gfb_base_bot,
                                               "/",
                                               gfb_base_mid,
                                               "/",
                                               gfb_outer,
                                               " base_h=",
                                               gfb_base_h,
                                               " wall=",
                                               wall,
                                               " floor_top=",
                                               gfb_base_h + floor_t,
                                               " label=",
                                               label_d,
                                               "x",
                                               label_t,
                                               " wedge=45 fillet=",
                                               label_r,
                                               " bin=",
                                               cols,
                                               "x",
                                               rows,
                                               " size=",
                                               cols* gf_pitch - 0.5,
                                               "x",
                                               rows* gf_pitch - 0.5);

// (cols, rows, units) でラベル付き bin を払い出す。例: gridfinity_bin(2, 4, 4)
module
gridfinity_bin(cols, rows, units = 4)
{
    echo(bin_contract(cols, rows, units));
    gfb_bin(cols, rows, units, wall, floor_t, label_d, label_t, label_r);
}
// main file
include <../../modules/gridfinity_bin_4u.scad>

// 5x1 マス、高さ 4U のラベル天板付き bin。ラベルは手前 (y=0) 側
gridfinity_bin(5, 1, 4);
